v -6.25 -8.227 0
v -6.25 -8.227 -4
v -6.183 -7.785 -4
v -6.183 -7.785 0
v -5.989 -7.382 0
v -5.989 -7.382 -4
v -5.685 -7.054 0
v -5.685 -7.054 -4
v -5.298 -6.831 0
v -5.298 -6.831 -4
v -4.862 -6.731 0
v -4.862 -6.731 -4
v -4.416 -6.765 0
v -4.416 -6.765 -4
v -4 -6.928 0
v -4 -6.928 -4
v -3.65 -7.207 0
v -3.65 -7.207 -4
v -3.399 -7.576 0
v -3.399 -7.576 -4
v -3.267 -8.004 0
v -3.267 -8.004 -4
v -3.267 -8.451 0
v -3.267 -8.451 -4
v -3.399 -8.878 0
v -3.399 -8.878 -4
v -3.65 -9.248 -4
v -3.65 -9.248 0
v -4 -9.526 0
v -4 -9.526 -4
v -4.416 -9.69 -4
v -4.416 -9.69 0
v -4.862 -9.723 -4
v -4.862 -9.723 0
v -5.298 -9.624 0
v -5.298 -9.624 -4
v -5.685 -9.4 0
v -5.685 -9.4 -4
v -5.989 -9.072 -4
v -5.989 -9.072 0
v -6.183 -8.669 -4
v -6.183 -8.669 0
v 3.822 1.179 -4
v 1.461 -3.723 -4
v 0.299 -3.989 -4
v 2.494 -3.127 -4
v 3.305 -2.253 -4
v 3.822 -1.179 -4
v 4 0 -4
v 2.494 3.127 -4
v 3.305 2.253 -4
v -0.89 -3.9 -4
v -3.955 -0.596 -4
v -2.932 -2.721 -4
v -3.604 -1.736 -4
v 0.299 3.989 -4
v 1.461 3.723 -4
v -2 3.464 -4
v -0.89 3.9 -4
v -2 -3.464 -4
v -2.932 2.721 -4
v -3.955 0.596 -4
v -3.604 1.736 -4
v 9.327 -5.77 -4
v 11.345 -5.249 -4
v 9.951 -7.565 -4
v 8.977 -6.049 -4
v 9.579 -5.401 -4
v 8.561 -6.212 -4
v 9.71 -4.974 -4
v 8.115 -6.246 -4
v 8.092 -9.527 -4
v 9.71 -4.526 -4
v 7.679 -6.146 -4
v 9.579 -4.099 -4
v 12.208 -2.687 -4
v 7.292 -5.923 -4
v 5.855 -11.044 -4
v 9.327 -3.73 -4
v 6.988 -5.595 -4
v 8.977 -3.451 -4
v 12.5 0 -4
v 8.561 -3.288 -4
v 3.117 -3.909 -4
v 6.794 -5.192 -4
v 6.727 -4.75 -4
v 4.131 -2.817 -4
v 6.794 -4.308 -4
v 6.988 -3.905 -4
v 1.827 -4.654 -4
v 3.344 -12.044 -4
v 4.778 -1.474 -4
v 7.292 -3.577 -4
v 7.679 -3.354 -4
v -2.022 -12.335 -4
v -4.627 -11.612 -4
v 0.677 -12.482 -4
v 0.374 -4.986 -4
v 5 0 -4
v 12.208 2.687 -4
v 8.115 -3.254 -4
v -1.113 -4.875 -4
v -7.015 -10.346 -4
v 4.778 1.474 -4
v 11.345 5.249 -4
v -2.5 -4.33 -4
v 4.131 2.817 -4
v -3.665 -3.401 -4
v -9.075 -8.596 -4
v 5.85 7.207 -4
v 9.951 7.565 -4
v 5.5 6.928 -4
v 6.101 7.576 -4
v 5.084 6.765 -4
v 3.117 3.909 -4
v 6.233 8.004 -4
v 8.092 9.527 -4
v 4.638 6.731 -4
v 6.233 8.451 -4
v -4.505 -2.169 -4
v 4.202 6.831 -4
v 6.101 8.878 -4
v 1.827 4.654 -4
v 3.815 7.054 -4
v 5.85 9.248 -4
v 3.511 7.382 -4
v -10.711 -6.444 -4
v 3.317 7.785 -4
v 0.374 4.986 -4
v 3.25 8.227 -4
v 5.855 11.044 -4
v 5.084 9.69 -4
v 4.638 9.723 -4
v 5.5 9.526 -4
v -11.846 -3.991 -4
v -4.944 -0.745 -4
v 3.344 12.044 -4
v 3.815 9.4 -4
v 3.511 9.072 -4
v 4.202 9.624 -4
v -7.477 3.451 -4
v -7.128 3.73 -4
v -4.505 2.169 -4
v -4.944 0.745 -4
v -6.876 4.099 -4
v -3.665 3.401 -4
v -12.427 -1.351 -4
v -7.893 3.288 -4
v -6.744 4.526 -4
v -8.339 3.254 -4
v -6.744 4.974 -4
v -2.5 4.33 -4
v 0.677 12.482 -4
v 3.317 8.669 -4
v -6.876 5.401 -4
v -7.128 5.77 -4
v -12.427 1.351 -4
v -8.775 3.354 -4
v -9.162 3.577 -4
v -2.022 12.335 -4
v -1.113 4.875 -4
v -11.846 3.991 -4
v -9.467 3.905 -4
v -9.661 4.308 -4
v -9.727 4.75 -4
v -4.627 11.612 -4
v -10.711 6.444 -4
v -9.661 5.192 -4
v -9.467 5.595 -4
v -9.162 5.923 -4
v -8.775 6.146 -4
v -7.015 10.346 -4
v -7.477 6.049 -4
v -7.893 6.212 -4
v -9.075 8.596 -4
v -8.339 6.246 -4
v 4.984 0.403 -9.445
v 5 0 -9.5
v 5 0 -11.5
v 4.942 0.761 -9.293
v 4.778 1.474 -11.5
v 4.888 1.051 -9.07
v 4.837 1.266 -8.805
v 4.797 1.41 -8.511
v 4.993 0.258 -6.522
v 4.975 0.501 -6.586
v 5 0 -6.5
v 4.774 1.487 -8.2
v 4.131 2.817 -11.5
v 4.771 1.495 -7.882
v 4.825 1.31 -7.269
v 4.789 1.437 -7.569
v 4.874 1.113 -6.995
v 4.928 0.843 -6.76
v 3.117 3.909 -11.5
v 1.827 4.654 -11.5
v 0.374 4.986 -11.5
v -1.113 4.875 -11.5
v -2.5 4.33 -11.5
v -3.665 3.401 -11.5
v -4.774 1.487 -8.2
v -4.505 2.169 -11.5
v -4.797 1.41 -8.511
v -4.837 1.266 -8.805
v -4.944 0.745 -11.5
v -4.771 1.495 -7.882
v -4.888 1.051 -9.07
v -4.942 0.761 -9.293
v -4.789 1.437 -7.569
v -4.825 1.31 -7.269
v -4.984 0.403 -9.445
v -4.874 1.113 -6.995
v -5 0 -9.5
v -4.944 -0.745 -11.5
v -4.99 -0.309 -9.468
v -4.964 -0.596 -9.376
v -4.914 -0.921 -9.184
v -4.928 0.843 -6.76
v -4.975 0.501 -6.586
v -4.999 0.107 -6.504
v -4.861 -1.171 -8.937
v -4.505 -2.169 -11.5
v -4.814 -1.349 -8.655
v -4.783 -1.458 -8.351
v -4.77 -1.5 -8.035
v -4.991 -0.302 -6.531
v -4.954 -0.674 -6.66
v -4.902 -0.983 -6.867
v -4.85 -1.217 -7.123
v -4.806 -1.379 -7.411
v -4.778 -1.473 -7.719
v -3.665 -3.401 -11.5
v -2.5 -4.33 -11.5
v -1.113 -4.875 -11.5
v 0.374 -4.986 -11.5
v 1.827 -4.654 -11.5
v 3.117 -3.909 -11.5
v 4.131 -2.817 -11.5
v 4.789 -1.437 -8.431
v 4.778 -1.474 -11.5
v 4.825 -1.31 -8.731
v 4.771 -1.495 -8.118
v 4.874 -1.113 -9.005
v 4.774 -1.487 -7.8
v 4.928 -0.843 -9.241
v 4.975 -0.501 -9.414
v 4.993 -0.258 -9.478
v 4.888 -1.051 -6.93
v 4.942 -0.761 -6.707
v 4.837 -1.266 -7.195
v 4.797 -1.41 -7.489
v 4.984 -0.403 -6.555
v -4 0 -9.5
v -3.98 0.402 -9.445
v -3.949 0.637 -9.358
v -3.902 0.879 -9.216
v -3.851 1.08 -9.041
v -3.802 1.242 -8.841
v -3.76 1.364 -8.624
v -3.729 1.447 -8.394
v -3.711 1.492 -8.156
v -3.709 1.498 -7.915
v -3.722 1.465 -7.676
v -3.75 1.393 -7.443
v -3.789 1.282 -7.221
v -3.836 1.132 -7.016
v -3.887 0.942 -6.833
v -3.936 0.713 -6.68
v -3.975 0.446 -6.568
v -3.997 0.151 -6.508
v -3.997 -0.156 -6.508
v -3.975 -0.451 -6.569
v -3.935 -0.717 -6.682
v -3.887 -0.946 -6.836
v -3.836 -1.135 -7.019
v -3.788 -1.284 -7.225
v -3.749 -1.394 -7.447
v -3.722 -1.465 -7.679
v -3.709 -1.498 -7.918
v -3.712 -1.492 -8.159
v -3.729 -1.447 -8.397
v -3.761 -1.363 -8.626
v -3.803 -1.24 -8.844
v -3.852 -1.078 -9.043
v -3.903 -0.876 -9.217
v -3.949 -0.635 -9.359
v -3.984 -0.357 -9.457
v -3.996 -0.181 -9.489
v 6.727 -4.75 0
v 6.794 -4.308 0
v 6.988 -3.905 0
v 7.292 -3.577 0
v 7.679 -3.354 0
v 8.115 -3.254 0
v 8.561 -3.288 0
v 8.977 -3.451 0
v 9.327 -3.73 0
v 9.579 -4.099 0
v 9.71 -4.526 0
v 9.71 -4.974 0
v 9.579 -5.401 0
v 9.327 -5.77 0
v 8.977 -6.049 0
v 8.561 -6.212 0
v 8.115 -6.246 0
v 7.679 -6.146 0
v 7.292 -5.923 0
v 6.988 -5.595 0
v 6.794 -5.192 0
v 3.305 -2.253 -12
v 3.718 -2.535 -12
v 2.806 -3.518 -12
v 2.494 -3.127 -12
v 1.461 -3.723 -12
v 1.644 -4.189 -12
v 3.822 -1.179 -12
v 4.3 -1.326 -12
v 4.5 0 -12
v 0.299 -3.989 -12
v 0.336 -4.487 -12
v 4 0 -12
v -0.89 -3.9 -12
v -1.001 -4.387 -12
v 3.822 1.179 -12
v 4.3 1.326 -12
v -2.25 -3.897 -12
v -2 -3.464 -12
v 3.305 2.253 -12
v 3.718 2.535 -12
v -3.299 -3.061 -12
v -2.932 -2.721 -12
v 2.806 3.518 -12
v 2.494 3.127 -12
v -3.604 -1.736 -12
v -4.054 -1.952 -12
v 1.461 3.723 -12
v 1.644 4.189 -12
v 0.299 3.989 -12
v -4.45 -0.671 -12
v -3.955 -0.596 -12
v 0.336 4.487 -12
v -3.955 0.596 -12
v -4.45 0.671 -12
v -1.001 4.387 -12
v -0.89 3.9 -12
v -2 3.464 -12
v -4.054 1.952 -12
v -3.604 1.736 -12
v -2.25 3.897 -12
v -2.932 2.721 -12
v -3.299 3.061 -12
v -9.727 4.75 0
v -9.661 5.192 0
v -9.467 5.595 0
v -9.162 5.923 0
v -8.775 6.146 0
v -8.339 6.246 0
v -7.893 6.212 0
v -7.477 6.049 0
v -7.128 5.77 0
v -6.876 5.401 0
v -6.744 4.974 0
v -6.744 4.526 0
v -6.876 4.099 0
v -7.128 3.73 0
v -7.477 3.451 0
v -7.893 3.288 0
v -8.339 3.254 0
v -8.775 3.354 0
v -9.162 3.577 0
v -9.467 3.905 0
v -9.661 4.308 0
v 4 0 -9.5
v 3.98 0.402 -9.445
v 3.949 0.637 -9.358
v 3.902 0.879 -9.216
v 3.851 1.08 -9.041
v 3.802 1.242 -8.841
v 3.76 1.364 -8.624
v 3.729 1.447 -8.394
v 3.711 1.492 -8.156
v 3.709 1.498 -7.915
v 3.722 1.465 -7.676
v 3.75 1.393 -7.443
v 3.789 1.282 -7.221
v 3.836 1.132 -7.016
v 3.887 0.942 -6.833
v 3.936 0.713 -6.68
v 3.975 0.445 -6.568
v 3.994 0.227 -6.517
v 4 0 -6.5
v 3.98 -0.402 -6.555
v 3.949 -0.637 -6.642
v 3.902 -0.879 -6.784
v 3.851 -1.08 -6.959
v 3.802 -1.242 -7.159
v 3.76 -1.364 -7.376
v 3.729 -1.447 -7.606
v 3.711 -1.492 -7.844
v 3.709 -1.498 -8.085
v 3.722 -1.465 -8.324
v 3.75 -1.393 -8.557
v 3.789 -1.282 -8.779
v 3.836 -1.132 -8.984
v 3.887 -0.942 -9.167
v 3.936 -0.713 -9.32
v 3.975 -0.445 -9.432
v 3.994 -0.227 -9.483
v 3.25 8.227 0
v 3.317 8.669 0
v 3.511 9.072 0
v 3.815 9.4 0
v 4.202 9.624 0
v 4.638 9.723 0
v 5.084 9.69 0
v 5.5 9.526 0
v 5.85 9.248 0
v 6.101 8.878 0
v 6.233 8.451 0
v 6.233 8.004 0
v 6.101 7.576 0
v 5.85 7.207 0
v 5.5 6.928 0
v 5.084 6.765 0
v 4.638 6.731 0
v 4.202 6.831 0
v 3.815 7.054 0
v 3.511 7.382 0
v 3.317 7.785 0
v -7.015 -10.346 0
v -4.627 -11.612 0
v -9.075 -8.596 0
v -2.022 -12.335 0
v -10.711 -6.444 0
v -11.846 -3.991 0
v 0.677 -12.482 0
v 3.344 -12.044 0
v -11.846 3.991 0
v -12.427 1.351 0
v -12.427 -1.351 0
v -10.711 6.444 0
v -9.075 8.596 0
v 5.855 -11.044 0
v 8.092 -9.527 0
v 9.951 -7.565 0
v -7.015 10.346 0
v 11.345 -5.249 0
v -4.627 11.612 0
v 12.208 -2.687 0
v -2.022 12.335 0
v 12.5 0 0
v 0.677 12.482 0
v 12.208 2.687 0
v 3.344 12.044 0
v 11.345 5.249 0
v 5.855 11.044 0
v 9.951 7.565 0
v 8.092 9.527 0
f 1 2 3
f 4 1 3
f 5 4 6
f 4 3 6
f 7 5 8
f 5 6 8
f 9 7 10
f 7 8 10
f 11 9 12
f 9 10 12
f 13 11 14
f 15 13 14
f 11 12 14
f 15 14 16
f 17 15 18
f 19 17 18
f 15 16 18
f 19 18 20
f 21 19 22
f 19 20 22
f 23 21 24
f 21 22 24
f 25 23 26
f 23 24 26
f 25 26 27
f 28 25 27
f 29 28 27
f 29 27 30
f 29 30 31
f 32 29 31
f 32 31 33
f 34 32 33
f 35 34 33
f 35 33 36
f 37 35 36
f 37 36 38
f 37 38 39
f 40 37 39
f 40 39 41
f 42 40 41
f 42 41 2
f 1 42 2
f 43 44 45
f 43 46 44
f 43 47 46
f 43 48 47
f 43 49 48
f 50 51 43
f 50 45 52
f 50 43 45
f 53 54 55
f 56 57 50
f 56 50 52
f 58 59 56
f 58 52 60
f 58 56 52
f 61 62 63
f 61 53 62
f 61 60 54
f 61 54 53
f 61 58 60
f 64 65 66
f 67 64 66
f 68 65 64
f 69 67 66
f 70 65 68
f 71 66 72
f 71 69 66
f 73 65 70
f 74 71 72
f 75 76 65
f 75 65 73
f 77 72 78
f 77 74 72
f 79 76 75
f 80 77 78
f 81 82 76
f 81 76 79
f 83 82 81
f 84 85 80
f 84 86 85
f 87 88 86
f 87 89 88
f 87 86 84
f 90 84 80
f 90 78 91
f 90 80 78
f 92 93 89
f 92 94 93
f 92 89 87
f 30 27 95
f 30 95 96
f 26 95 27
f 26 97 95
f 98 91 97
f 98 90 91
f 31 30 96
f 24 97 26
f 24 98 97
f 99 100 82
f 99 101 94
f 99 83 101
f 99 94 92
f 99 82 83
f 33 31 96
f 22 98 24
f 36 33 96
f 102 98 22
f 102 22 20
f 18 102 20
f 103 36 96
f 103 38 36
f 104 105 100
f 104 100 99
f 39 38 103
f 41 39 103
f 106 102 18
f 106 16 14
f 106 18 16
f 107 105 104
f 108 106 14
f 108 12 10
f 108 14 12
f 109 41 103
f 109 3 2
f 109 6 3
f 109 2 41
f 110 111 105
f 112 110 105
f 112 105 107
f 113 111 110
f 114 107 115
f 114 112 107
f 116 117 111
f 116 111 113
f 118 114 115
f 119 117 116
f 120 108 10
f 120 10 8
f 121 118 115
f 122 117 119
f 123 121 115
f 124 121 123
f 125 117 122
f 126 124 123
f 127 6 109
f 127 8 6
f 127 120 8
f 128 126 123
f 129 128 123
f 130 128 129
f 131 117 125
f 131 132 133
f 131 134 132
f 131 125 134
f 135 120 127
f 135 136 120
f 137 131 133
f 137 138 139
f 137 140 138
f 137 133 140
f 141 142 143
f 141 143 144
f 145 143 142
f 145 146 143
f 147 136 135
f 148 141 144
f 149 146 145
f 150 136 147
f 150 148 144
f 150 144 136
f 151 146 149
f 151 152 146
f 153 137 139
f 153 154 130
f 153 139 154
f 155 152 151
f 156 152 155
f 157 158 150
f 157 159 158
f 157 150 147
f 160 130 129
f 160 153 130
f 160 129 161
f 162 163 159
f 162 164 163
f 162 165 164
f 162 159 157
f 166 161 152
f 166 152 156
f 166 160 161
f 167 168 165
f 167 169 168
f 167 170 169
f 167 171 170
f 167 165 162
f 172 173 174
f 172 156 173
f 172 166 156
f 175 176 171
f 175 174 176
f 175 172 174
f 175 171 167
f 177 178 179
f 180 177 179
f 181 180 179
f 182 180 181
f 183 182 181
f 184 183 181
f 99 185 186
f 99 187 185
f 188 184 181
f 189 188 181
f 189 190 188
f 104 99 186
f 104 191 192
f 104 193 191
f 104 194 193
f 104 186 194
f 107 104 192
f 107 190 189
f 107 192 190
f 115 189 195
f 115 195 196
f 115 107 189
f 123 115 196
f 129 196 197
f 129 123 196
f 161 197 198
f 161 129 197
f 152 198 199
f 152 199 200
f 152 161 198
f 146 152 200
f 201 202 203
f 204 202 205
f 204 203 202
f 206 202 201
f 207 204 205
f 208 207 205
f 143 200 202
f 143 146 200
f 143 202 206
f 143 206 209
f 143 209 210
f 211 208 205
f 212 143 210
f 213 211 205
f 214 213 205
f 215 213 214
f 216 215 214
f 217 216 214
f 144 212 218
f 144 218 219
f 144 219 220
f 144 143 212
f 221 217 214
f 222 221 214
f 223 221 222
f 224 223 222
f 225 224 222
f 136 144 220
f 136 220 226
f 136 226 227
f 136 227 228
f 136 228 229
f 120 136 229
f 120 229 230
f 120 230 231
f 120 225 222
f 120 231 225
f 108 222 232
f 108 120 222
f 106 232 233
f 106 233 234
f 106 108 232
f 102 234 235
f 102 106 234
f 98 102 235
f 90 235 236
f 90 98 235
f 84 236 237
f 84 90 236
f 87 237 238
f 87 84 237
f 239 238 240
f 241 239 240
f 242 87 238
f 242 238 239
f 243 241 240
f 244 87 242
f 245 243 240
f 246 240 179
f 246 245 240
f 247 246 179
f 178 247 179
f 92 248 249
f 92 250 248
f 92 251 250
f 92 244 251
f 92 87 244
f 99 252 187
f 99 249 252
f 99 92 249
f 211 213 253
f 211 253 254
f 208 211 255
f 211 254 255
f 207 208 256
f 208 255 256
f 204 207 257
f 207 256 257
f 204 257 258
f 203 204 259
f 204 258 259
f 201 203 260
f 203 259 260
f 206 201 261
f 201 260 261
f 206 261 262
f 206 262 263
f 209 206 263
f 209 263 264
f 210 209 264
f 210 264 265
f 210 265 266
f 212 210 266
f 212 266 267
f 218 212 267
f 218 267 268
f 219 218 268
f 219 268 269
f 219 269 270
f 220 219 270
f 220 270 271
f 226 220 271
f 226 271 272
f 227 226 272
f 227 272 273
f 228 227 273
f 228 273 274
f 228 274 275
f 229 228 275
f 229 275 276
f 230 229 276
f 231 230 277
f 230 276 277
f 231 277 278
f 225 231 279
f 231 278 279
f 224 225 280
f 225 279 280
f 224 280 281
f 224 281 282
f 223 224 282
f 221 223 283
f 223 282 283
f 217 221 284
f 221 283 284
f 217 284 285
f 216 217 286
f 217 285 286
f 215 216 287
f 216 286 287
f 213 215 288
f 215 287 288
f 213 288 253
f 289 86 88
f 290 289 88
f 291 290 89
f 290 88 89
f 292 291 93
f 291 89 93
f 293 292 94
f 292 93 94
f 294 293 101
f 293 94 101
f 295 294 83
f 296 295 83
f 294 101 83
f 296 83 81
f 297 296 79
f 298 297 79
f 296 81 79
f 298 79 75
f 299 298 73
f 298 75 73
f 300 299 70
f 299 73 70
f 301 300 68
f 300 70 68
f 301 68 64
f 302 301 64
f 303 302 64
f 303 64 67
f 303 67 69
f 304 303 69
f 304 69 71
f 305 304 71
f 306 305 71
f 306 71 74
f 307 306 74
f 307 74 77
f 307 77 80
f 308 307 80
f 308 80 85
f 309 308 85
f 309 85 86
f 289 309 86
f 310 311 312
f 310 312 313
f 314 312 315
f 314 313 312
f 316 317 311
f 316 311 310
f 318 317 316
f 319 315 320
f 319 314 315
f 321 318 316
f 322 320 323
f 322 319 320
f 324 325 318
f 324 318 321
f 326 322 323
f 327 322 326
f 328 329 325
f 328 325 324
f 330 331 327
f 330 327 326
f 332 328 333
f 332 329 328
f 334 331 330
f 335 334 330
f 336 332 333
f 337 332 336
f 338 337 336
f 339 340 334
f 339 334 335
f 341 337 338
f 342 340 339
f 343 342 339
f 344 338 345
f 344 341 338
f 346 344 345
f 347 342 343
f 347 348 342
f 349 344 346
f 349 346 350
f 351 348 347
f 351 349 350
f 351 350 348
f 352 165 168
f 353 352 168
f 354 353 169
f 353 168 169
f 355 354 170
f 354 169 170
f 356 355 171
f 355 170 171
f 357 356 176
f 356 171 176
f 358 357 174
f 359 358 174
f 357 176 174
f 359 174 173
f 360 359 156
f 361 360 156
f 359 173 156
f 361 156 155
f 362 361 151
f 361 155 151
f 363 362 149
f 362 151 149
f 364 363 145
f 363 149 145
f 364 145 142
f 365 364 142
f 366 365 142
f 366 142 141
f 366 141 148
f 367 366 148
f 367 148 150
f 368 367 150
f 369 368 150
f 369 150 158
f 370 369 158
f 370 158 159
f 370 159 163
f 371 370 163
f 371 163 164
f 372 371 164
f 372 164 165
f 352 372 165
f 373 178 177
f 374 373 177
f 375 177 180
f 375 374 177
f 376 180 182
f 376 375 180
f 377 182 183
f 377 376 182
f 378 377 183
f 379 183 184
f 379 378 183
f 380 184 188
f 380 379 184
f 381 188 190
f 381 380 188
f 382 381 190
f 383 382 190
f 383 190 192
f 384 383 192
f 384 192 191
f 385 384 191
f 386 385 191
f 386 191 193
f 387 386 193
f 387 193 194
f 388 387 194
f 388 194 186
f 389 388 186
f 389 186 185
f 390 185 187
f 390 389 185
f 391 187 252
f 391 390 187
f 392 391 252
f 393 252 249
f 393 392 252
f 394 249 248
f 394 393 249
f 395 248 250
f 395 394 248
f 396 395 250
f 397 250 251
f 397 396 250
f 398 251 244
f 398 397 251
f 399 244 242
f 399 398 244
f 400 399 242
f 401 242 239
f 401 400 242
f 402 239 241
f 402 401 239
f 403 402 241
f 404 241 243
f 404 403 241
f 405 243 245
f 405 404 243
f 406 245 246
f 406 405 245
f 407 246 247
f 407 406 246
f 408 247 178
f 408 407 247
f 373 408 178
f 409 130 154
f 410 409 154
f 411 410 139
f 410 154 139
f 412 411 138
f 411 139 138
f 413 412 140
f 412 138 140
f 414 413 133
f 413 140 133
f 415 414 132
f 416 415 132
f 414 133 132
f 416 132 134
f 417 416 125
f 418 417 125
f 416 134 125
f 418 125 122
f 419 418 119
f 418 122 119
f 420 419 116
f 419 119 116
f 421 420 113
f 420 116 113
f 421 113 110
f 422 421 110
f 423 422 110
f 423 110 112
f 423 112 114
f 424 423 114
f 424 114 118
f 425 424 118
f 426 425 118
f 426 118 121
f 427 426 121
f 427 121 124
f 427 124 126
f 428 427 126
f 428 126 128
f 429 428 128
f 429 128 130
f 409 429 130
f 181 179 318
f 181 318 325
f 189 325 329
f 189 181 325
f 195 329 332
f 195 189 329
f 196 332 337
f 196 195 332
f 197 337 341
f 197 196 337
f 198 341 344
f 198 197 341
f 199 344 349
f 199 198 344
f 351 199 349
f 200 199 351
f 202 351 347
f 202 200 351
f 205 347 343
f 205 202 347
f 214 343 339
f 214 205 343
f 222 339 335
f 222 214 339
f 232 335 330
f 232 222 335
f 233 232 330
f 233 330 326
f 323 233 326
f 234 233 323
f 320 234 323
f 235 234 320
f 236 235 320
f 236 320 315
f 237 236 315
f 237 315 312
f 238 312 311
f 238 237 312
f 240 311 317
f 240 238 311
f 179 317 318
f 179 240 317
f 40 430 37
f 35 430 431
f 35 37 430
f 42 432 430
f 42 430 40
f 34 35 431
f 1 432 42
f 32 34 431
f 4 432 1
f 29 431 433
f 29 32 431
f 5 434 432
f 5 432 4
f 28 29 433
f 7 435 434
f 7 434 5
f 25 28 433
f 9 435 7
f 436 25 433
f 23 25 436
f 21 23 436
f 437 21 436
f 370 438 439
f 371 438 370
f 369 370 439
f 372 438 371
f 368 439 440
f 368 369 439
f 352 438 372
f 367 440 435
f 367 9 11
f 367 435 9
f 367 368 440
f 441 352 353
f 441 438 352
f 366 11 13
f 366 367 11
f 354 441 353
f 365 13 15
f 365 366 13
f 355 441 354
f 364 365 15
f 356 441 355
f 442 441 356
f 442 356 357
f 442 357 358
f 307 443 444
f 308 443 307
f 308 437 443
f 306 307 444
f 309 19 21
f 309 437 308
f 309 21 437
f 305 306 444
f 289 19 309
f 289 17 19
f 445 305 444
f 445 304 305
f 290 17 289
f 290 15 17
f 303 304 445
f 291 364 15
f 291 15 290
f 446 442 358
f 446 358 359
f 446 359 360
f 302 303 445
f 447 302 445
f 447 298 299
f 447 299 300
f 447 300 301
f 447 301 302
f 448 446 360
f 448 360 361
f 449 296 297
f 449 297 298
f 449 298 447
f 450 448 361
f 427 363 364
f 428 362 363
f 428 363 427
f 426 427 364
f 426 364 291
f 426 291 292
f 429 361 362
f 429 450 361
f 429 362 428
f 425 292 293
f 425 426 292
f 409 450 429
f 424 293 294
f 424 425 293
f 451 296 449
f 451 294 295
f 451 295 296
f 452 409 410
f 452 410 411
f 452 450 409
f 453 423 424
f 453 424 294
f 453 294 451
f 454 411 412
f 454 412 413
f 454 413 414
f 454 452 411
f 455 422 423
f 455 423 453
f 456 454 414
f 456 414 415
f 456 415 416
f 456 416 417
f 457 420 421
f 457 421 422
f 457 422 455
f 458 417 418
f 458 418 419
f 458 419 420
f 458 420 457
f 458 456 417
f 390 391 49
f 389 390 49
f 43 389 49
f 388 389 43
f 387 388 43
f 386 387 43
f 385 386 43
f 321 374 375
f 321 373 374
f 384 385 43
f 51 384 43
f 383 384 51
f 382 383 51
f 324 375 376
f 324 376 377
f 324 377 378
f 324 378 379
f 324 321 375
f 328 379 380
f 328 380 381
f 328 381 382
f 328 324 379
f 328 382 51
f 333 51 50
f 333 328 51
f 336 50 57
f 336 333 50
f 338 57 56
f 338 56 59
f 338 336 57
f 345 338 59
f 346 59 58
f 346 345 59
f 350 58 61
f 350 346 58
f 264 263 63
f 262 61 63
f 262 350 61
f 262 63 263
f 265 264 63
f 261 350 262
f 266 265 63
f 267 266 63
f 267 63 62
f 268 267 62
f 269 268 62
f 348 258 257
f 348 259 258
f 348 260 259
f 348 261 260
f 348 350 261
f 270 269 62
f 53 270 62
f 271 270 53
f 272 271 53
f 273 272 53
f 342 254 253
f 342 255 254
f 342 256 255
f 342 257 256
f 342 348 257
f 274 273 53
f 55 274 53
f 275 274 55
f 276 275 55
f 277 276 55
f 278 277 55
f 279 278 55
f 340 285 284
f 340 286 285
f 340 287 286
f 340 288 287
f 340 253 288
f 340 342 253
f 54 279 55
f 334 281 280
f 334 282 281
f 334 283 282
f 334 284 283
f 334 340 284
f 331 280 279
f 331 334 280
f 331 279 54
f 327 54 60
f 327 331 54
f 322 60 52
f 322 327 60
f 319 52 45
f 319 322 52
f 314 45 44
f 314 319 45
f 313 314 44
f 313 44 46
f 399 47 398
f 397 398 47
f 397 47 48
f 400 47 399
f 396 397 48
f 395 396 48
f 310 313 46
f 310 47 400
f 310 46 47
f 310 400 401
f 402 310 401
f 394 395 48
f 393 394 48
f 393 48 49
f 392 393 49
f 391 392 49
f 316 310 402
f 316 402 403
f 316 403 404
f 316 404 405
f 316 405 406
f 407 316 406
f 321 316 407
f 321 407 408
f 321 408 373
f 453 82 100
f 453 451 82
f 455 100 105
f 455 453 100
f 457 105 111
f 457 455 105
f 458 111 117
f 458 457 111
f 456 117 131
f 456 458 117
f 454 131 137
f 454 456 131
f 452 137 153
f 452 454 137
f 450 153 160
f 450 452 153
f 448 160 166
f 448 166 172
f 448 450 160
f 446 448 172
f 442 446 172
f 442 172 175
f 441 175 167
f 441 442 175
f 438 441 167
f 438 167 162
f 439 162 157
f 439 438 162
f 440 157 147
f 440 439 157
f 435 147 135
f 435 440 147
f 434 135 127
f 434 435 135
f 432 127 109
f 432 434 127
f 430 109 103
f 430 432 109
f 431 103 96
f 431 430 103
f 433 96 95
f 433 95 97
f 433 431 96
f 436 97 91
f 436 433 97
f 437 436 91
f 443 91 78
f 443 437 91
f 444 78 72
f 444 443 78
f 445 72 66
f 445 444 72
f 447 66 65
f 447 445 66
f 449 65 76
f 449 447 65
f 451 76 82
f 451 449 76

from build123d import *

# Parameters (mm, degrees)
CUT_EXTRUDE1_REACH      = 6
SKETCH13_R              = 1.5
SKETCH5_R               = 1.5
CUT_EXTRUDE2_DEPTH      = 13.5
CUT_EXTRUDE2_DEPTH_BACK = 13.5
CHAMFER1_SIZE           = 0.5


with BuildPart() as part:
    # Sketch1 → Revolve1 (revolve)
    with BuildSketch(Plane(origin=(0, 0, 0), x_dir=(1, 0, 0), z_dir=(0, 1, 0))):
        Polygon((0, 0), (0, 4), (4, 4), (4, 12), (5, 12), (5, 4), (12.5, 4), (12.5, 0), align=None)
    revolve(axis=Axis((0, 0, 0), (0, 0, 1)))

    # Sketch13 → Cut-Extrude1 (cut, up to next)
    with BuildSketch(Plane(origin=(0, 0, -4), x_dir=(-1, 0, 0), z_dir=(0, 0, -1)), mode=Mode.PRIVATE) as cut_extrude1_sk1:
        with Locations((-4.75, 8.227241336)):
            Circle(SKETCH13_R)
    cut_extrude1_tool1 = extrude(cut_extrude1_sk1.sketch, amount=-CUT_EXTRUDE1_REACH, mode=Mode.PRIVATE) & part.part
    add(cut_extrude1_tool1.solids().sort_by_distance((4.75, 8.227241, -4))[0], mode=Mode.SUBTRACT)
    # Sketch13 → Cut-Extrude1 (cut, up to next)
    with BuildSketch(Plane(origin=(0, 0, -4), x_dir=(-1, 0, 0), z_dir=(0, 0, -1)), mode=Mode.PRIVATE) as cut_extrude1_sk2:
        with Locations((-8.227241336, -4.75)):
            Circle(SKETCH13_R)
    cut_extrude1_tool2 = extrude(cut_extrude1_sk2.sketch, amount=-CUT_EXTRUDE1_REACH, mode=Mode.PRIVATE) & part.part
    add(cut_extrude1_tool2.solids().sort_by_distance((8.227241, -4.75, -4))[0], mode=Mode.SUBTRACT)
    # Sketch13 → Cut-Extrude1 (cut, up to next)
    with BuildSketch(Plane(origin=(0, 0, -4), x_dir=(-1, 0, 0), z_dir=(0, 0, -1)), mode=Mode.PRIVATE) as cut_extrude1_sk3:
        with Locations((4.75, -8.227241336)):
            Circle(SKETCH13_R)
    cut_extrude1_tool3 = extrude(cut_extrude1_sk3.sketch, amount=-CUT_EXTRUDE1_REACH, mode=Mode.PRIVATE) & part.part
    add(cut_extrude1_tool3.solids().sort_by_distance((-4.75, -8.227241, -4))[0], mode=Mode.SUBTRACT)
    # Sketch13 → Cut-Extrude1 (cut, up to next)
    with BuildSketch(Plane(origin=(0, 0, -4), x_dir=(-1, 0, 0), z_dir=(0, 0, -1)), mode=Mode.PRIVATE) as cut_extrude1_sk4:
        with Locations((8.227241336, 4.75)):
            Circle(SKETCH13_R)
    cut_extrude1_tool4 = extrude(cut_extrude1_sk4.sketch, amount=-CUT_EXTRUDE1_REACH, mode=Mode.PRIVATE) & part.part
    add(cut_extrude1_tool4.solids().sort_by_distance((-8.227241, 4.75, -4))[0], mode=Mode.SUBTRACT)

    # Sketch5 → Cut-Extrude2 (cut, two sides)
    with BuildSketch(Plane(origin=(0, 0, 0), x_dir=(0, 0, -1), z_dir=(1, 0, 0))) as cut_extrude2_sk:
        with Locations((8, 0)):
            Circle(SKETCH5_R)
    extrude(amount=CUT_EXTRUDE2_DEPTH, mode=Mode.SUBTRACT)
    extrude(cut_extrude2_sk.sketch, amount=-CUT_EXTRUDE2_DEPTH_BACK, mode=Mode.SUBTRACT)

    # Chamfer1
    chamfer1_edges = [part.edges().sort_by_distance(p)[0] for p in [
        (-5, 0, -12),
    ]]
    chamfer(chamfer1_edges, length=CHAMFER1_SIZE)


solid = part.part
